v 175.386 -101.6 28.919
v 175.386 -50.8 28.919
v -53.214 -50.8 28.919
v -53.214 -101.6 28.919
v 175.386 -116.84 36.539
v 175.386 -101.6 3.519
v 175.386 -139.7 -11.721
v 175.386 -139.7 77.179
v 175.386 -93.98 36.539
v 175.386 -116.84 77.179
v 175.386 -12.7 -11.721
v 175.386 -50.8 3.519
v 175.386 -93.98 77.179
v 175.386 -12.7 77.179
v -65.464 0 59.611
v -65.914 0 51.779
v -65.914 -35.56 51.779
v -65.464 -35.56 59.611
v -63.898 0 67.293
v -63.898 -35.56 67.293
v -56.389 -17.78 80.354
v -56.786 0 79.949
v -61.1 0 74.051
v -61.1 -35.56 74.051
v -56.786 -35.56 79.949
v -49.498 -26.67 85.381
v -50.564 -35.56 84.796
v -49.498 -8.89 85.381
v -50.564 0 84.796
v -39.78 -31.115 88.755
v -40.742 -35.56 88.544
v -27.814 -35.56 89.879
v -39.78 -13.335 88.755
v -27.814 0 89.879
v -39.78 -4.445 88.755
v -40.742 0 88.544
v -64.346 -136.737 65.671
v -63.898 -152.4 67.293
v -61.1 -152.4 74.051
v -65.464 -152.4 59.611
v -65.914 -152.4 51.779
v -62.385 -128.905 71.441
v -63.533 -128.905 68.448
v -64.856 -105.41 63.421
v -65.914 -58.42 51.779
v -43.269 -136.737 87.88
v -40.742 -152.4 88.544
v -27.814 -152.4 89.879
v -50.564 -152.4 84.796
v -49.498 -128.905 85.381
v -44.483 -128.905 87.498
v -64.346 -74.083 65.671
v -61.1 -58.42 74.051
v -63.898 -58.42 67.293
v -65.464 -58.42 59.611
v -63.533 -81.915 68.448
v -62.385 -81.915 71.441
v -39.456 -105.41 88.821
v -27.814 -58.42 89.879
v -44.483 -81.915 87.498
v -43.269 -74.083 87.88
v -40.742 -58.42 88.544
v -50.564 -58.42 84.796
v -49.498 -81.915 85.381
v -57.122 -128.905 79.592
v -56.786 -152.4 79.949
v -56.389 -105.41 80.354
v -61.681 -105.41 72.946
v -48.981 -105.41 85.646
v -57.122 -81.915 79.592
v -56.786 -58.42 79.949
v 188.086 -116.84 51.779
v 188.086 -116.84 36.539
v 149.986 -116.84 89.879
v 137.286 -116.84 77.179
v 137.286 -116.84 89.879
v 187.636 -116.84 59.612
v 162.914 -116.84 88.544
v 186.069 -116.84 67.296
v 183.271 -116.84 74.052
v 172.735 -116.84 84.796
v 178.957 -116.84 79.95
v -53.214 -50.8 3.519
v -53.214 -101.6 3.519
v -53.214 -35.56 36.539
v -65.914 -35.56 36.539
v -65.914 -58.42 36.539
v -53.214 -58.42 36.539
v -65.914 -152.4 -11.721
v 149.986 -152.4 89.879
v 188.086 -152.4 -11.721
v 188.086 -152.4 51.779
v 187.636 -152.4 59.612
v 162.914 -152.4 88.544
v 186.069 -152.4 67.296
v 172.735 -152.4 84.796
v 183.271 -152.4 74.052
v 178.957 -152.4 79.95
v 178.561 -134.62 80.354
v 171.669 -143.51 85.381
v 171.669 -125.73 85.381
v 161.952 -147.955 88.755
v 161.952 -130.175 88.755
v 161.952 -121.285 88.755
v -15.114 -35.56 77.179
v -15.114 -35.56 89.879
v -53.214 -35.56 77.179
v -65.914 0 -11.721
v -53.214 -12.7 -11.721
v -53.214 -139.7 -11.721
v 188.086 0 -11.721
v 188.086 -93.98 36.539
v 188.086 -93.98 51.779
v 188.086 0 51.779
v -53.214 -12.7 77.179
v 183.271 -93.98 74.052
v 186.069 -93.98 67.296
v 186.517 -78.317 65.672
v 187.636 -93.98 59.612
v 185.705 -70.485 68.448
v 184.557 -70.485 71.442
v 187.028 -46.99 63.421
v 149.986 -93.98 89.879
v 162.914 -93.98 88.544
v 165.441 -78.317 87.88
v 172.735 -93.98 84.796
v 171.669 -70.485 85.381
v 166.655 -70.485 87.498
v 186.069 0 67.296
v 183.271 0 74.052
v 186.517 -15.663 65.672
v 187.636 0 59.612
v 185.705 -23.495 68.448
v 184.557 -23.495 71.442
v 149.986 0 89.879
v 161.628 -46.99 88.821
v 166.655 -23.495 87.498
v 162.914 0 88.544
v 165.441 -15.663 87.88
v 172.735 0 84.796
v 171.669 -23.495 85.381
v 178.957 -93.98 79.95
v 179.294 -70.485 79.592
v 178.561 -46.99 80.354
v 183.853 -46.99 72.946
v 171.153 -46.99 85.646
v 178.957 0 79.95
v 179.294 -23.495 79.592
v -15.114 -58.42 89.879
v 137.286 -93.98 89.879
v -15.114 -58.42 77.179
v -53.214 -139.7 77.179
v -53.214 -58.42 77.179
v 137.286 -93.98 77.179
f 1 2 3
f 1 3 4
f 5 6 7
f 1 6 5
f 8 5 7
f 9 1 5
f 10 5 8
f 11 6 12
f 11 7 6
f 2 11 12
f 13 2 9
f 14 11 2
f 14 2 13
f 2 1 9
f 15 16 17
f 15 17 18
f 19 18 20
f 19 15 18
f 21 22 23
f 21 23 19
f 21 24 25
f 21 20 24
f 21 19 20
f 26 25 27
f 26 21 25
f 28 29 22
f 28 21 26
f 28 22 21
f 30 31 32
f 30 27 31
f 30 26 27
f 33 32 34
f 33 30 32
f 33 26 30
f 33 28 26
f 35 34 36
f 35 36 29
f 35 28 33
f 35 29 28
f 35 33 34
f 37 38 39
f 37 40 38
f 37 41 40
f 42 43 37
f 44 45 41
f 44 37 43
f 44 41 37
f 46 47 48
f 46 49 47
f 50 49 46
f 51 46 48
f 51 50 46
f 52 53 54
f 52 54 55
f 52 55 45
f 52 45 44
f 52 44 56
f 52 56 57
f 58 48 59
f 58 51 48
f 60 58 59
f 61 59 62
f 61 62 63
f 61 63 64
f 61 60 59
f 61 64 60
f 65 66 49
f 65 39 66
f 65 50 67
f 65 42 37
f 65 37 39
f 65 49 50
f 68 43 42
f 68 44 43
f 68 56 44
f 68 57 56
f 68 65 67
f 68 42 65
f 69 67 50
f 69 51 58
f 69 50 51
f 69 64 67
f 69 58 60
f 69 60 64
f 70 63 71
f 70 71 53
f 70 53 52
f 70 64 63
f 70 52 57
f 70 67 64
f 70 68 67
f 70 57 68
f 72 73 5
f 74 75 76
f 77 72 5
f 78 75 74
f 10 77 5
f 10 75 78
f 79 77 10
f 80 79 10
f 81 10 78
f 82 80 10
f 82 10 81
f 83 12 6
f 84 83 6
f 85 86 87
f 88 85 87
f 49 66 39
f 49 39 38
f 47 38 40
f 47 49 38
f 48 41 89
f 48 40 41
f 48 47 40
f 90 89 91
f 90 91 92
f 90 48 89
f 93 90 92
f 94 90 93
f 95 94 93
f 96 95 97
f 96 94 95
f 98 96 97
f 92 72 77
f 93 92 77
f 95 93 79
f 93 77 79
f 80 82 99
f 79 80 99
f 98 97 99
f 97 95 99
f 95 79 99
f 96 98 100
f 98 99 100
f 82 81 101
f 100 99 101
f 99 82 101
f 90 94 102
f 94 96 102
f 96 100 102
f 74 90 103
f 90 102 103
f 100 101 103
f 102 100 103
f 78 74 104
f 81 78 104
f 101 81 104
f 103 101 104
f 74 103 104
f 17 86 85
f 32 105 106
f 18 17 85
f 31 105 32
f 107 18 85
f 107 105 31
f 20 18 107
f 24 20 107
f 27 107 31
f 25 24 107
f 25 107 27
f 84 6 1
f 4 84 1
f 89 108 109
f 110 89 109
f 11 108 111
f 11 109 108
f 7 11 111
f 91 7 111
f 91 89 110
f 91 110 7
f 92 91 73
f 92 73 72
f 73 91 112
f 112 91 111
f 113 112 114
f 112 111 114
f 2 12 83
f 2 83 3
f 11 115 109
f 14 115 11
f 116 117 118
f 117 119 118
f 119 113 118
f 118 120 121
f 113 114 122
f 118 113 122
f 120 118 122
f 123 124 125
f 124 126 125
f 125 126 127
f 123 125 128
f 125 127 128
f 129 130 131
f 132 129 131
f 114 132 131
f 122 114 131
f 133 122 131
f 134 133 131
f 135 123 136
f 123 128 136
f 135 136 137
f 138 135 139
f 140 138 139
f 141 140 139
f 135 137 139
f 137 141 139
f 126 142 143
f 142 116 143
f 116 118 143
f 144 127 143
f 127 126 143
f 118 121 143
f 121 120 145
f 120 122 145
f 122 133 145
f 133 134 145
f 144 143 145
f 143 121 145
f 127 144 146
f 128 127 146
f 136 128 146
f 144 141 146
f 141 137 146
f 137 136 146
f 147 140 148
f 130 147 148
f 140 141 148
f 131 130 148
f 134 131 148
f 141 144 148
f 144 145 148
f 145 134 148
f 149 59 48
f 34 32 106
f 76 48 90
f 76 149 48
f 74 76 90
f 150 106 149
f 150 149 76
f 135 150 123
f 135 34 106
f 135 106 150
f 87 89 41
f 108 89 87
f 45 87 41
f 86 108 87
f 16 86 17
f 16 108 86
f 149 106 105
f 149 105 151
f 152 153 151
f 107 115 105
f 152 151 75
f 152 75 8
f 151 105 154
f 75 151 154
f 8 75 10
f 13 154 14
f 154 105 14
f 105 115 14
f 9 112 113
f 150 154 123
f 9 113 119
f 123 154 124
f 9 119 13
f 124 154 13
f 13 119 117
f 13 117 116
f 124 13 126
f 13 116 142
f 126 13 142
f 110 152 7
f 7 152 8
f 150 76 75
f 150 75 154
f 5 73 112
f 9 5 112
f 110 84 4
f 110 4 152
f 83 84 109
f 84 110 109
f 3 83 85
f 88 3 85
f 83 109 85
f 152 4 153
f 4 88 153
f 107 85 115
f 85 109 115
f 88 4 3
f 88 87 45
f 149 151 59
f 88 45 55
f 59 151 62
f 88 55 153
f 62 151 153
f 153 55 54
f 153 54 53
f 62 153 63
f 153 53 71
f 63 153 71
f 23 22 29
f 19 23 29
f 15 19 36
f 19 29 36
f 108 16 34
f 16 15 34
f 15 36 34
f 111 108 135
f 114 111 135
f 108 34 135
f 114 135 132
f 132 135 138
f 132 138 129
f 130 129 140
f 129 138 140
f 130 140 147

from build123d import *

# Parameters (mm, degrees)
F0_W        = 254
F0_H        = 177.8
F1_DEPTH    = 152.4
F2_T        = -12.7
F3_T1_DEPTH = 342.9
F4_T1_DEPTH = 342.9
F5_W        = 22.86
F5_H        = 83.3190586418
F6_DEPTH    = 50.8
F7_W        = 22.86
F7_H        = 76.2
F8_DEPTH    = 50.8
F9_W        = 50.8
F9_H        = 25.4
F10_DEPTH   = 233.68
F11_W       = 254
F11_H       = 76.2
F12_DEPTH   = 180.34


# Not quite as in the source:
# - a fillet or chamfer that OpenCascade refuses, or shapes differently, is made with other operations: its cross-section is extruded or revolved along the edge and cut away or added


with BuildPart() as f1:
    # F0 (on Front) → F1 (new body)
    with BuildSketch(Plane.XZ):
        with Locations((61.0858832002, 0.9791328073)):
            Rectangle(F0_W, F0_H)
    extrude(amount=F1_DEPTH)

    # F2
    f2_openings = [f1.faces().sort_by_distance(p)[0] for p in [
        (61.085883, -76.2, -87.920867),
    ]]
    offset(amount=F2_T, openings=f2_openings)

    # F3: fillet of radius 38.1 on 1 edges, made by hand

    # F3_s2 → F3_t1 (cut)
    with BuildSketch(Plane.XZ.offset(-95.25)):
        with BuildLine():
            add(Edge.make_bspline(
                [(188.0858832002, 51.7791328073), (188.0858832002, 89.8791328073), (149.9858832002, 89.8791328073)],
                knots=[0, 0, 0, 1, 1, 1], degree=2, weights=[1, 1, 1]))
            Line((149.9858832002, 89.8791328073), (188.0858832002, 89.8791328073))
            Line((188.0858832002, 89.8791328073), (188.0858832002, 51.7791328073))
        make_face()
    extrude(amount=F3_T1_DEPTH, mode=Mode.SUBTRACT)

    # F4: fillet of radius 38.1 on 1 edges, made by hand

    # F4_s2 → F4_t1 (cut)
    with BuildSketch(Plane.XZ.offset(-95.25)):
        with BuildLine():
            add(Edge.make_bspline(
                [(-65.9141167998, 51.7791328073), (-65.9141167998, 89.8791328073), (-27.8141167998, 89.8791328073)],
                knots=[0, 0, 0, 1, 1, 1], degree=2, weights=[1, 1, 1]))
            Line((-27.8141167998, 89.8791328073), (-65.9141167998, 89.8791328073))
            Line((-65.9141167998, 89.8791328073), (-65.9141167998, 51.7791328073))
        make_face()
    extrude(amount=F4_T1_DEPTH, mode=Mode.SUBTRACT)

    # F5 (on face) → F6 (cut)
    with BuildSketch(Plane(origin=(-65.9141167998, 0, 0), x_dir=(0, -1, 0), z_dir=(-1, 0, 0))):
        with Locations((46.99, 78.1986621282)):
            Rectangle(F5_W, F5_H)
    extrude(amount=-F6_DEPTH, mode=Mode.SUBTRACT)

    # F7 (on face) → F8 (cut)
    with BuildSketch(Plane.YZ.offset(188.0858832002)):
        with Locations((-105.41, 74.6391328073)):
            Rectangle(F7_W, F7_H)
    extrude(amount=-F8_DEPTH, mode=Mode.SUBTRACT)

    # F9 (on face) → F10 (join)
    with BuildSketch(Plane(origin=(175.3858832002, 0, 0), x_dir=(0, -1, 0), z_dir=(-1, 0, 0))):
        with Locations((76.2, 16.2191328073)):
            Rectangle(F9_W, F9_H)
    extrude(amount=F10_DEPTH)

    # F11 (on face) → F12 (cut)
    with BuildSketch(Plane.XZ.offset(152.4)):
        with Locations((61.0858832002, -49.8208671927)):
            Rectangle(F11_W, F11_H)
    extrude(amount=-F12_DEPTH, mode=Mode.SUBTRACT)


solid = f1.part
